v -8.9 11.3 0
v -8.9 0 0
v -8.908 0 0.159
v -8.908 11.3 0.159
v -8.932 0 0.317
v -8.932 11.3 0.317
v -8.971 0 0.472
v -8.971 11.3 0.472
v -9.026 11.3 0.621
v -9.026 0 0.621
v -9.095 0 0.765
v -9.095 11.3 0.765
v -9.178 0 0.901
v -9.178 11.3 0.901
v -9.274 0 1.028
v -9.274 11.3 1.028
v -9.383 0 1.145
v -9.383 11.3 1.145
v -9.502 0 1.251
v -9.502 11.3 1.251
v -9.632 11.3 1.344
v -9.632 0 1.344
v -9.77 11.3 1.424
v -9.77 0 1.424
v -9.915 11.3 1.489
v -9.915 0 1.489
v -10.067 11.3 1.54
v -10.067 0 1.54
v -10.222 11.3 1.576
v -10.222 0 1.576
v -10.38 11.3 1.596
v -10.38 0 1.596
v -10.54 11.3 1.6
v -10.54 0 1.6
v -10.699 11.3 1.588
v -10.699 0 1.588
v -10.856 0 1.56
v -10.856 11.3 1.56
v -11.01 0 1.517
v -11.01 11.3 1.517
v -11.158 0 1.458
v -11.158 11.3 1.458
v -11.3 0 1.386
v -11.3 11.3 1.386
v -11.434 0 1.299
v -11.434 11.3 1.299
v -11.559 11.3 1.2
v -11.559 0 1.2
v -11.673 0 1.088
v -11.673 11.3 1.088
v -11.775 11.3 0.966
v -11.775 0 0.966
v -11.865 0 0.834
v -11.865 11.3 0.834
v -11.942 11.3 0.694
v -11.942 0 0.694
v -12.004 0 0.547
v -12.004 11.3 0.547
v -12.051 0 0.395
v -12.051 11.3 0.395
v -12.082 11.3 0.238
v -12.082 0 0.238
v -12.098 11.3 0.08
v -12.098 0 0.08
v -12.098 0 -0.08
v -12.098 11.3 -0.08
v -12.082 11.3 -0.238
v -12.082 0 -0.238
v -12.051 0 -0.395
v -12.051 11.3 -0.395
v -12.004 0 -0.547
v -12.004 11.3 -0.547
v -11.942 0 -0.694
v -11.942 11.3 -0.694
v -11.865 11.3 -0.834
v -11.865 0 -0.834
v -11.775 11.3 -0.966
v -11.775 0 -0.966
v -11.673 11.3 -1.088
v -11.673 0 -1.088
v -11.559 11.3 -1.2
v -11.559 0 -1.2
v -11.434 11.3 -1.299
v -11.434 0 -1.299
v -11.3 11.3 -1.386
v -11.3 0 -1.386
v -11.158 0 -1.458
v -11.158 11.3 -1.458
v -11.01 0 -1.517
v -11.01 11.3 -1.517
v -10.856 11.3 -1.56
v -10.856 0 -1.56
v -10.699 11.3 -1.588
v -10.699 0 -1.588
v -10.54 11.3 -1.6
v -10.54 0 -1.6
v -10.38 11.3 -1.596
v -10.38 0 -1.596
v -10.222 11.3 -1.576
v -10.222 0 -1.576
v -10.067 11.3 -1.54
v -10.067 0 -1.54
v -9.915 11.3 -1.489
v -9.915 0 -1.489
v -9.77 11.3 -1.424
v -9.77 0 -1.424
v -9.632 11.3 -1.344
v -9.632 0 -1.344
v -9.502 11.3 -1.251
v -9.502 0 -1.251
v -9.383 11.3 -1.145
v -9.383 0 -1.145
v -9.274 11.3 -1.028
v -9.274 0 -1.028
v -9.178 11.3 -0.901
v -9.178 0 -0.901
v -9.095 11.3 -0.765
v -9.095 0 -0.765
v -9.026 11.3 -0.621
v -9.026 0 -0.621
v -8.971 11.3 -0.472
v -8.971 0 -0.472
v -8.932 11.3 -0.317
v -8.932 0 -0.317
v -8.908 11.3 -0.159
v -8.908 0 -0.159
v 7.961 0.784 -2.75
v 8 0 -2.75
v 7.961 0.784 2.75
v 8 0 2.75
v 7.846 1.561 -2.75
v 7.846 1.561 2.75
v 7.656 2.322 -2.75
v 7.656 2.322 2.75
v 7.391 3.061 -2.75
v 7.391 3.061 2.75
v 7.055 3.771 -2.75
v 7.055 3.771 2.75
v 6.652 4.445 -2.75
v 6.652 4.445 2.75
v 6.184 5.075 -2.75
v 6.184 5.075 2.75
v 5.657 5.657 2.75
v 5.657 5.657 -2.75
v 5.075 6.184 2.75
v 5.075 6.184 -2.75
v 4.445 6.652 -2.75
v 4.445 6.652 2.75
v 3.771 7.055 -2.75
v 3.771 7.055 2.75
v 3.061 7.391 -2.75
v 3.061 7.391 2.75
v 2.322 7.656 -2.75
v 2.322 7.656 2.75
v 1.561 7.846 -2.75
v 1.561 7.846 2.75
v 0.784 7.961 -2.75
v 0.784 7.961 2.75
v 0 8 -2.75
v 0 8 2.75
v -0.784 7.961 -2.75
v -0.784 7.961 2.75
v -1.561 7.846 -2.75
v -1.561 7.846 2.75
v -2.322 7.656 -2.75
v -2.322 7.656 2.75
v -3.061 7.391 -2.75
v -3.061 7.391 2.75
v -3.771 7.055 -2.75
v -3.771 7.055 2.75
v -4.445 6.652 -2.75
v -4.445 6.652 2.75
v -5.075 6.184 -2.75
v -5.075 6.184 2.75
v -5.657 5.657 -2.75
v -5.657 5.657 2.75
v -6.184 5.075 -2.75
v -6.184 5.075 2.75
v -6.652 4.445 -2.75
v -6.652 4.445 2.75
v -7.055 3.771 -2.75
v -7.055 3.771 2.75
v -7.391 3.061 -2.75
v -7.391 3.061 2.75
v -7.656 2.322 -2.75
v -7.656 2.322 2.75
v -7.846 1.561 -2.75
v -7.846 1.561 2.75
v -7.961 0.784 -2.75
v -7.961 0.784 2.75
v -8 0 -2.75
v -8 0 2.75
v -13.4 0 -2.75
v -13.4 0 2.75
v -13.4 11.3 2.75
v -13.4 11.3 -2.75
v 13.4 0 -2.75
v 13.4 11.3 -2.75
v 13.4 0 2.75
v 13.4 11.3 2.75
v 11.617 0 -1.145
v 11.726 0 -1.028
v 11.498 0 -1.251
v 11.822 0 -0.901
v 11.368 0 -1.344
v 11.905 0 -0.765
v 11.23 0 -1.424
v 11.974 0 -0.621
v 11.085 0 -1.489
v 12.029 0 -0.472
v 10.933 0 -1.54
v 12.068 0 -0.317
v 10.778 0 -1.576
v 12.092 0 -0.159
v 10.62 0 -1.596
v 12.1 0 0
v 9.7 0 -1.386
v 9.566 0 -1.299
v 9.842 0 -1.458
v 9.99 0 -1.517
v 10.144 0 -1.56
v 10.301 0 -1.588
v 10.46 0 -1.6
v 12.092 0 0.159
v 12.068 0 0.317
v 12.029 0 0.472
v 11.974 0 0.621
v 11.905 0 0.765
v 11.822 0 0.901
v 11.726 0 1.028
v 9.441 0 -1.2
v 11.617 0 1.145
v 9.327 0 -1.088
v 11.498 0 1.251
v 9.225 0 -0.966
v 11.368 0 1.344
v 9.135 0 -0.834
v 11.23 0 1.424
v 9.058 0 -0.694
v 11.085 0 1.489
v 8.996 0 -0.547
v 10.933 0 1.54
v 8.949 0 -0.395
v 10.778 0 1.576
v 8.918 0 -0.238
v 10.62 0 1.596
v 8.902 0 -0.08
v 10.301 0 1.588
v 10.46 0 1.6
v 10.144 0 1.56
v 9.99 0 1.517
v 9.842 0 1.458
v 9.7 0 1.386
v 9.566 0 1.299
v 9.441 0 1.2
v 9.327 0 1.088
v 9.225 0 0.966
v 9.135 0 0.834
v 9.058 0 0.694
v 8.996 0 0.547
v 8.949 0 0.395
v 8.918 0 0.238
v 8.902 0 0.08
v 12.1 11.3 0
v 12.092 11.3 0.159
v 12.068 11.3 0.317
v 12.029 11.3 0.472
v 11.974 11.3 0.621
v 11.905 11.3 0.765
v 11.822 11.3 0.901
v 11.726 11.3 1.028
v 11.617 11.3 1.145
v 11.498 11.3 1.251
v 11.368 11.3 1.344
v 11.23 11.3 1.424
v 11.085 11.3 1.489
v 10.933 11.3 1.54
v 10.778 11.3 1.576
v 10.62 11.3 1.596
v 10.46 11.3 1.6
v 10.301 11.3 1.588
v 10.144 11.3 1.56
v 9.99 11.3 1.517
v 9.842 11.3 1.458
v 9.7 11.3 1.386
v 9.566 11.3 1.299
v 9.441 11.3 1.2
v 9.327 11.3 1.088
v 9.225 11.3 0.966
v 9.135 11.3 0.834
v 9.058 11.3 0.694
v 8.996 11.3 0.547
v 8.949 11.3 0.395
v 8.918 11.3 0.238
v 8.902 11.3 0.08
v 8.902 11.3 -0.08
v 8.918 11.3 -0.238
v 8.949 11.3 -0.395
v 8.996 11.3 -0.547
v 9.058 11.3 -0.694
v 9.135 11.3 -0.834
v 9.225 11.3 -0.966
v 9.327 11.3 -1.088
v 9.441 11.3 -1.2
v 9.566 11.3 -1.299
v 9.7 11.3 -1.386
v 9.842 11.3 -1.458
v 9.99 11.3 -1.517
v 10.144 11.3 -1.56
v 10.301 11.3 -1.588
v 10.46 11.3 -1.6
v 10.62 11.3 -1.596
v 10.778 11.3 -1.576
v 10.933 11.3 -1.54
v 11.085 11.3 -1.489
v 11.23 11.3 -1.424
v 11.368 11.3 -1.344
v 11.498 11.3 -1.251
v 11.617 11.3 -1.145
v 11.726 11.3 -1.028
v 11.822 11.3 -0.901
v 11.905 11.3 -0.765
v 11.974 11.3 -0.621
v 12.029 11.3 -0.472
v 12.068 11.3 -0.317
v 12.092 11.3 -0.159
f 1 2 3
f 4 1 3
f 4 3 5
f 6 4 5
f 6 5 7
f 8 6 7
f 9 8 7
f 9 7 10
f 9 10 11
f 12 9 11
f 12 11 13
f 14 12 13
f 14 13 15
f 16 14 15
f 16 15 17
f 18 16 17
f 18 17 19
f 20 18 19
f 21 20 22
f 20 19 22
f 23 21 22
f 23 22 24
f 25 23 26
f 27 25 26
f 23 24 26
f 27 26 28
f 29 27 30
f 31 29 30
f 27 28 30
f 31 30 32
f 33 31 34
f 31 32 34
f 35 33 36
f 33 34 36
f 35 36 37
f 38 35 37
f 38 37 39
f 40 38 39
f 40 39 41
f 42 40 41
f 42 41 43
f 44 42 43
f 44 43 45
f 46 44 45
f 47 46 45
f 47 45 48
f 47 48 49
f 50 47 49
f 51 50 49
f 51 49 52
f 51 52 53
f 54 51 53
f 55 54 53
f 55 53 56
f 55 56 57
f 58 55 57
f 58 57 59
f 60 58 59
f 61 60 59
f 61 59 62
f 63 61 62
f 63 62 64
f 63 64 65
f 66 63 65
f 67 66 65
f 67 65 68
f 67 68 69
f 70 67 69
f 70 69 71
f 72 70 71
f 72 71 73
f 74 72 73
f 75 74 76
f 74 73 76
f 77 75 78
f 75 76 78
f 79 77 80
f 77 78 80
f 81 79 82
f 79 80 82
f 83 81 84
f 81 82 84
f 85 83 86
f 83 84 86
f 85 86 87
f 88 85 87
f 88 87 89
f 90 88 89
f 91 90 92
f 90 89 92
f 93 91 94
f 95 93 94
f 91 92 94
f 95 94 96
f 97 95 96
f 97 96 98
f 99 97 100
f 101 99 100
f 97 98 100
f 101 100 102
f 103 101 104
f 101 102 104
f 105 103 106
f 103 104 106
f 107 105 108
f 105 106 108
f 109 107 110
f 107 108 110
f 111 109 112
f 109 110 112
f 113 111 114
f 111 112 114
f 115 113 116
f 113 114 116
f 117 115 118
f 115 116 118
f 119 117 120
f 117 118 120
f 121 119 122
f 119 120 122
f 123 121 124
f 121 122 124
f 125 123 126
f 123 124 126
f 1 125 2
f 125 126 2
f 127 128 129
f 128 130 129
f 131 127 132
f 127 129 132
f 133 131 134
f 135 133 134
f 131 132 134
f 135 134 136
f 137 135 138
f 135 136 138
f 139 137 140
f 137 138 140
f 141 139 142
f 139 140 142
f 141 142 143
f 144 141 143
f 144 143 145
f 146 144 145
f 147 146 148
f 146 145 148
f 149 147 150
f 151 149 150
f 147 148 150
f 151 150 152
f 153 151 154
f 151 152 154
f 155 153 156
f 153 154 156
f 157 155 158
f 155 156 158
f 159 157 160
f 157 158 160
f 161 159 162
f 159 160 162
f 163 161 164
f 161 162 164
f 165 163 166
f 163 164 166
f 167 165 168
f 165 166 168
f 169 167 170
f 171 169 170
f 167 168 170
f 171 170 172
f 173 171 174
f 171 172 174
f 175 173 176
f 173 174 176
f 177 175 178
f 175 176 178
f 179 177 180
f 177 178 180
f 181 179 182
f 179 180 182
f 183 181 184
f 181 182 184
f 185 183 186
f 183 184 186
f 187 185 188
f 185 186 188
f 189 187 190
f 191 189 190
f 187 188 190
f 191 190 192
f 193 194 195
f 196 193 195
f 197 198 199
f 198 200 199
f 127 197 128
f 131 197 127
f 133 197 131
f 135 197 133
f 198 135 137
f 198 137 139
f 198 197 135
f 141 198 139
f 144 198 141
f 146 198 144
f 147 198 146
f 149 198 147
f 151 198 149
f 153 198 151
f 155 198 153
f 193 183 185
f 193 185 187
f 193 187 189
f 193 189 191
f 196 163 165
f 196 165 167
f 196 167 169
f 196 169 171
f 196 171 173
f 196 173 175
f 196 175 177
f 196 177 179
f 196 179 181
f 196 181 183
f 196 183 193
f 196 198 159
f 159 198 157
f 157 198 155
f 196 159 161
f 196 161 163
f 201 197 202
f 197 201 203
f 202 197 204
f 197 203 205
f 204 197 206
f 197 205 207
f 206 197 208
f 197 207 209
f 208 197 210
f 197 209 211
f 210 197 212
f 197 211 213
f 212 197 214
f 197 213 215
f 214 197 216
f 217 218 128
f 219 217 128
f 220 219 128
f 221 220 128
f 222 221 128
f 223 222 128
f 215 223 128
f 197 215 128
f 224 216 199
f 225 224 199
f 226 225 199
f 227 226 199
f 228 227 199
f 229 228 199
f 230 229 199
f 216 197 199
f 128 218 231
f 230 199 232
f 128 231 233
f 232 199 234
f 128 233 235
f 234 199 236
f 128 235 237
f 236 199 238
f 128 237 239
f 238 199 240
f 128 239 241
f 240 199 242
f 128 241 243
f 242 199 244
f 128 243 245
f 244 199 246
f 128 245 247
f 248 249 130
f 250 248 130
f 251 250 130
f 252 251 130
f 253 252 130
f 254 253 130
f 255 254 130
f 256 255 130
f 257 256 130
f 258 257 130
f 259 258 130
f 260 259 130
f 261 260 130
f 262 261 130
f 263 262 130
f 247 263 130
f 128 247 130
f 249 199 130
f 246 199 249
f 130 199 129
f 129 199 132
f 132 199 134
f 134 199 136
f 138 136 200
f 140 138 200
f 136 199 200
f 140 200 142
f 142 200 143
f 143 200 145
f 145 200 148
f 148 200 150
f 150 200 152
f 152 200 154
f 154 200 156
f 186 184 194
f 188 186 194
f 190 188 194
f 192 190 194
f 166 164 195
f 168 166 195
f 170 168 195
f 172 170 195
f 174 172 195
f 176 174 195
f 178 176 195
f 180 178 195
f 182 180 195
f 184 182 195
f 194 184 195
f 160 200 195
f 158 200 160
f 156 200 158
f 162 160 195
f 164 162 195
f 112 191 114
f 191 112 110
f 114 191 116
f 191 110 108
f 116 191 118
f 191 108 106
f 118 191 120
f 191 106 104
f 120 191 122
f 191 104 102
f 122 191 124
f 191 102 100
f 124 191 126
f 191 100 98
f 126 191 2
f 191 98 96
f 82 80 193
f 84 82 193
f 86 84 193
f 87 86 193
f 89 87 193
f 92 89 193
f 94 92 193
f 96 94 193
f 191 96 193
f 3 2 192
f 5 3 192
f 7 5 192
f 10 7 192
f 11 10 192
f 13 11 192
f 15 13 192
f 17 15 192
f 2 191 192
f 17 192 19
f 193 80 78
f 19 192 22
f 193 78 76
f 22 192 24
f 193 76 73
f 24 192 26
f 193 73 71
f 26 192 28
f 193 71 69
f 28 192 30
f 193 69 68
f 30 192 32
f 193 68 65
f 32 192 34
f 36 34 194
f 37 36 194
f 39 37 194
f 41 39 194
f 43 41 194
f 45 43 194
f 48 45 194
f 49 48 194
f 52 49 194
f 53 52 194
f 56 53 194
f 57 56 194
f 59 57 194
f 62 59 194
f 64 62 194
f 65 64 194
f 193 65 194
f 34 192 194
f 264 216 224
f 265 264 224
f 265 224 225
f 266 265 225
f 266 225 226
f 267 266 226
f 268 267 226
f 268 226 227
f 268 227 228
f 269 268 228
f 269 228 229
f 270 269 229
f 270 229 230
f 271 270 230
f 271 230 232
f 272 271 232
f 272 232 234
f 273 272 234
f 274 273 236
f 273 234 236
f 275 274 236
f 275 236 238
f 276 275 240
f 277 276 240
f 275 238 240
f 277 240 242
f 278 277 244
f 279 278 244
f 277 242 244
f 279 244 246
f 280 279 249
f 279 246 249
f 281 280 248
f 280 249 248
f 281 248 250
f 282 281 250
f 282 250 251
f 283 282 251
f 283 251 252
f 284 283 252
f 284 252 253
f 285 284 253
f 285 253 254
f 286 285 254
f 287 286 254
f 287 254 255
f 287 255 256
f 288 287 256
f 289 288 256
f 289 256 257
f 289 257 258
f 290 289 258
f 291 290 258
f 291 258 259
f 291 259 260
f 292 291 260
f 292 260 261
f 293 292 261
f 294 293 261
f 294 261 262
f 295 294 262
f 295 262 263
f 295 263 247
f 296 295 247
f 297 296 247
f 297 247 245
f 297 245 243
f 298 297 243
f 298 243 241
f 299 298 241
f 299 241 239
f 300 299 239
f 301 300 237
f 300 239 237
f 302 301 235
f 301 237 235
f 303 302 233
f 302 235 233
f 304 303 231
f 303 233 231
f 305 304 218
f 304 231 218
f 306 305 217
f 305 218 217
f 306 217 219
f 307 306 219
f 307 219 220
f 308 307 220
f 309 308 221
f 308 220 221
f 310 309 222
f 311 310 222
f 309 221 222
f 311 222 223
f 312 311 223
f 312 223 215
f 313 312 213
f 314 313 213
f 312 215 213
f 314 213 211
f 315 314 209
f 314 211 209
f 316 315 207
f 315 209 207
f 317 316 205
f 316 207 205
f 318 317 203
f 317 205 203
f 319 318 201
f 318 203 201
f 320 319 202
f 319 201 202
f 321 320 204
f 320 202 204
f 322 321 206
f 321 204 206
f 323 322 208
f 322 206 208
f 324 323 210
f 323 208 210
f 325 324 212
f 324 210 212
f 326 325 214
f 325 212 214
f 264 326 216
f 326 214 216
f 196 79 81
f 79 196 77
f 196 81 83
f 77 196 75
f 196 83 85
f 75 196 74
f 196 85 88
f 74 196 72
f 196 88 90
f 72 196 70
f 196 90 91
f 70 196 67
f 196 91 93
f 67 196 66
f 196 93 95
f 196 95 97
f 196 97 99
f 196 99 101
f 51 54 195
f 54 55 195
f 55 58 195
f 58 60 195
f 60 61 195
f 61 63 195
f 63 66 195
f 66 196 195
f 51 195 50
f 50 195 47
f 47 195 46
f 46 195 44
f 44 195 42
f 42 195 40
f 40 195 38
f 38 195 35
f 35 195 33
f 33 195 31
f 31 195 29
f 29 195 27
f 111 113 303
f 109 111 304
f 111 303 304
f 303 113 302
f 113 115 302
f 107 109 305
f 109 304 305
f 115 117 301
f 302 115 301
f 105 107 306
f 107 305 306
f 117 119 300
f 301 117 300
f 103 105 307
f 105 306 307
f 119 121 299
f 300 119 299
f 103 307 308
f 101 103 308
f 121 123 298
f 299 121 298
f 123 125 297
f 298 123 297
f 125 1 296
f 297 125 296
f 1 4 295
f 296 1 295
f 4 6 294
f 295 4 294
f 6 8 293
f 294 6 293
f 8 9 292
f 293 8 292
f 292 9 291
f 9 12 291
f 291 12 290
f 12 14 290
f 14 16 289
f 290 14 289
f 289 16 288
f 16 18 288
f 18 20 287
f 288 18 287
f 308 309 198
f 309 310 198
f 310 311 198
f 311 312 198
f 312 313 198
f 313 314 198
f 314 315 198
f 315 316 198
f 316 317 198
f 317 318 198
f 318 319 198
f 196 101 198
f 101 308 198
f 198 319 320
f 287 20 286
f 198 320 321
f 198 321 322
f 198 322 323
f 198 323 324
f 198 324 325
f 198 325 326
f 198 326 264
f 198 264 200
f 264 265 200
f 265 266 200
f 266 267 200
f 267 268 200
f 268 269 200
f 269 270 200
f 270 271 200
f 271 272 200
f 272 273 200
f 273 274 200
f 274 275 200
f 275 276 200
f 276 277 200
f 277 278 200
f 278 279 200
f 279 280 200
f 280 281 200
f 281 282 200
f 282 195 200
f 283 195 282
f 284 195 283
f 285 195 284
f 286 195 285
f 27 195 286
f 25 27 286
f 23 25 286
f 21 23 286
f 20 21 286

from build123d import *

# Parameters (mm, degrees)
BOSS_EXTRUDE1_DEPTH = 2.75
SKETCH2_R           = 1.6
CUT_EXTRUDE1_DEPTH  = 18.742956349


with BuildPart() as part:
    # Sketch1 → Boss-Extrude1 (new, symmetric)
    with BuildSketch(Plane.XY):
        with BuildLine():
            Line((-13.4, 11.3), (13.4, 11.3))
            Line((13.4, 11.3), (13.4, 0))
            Line((13.4, 0), (8, 0))
            ThreePointArc((8, 0), (0, 8), (-8, 0))
            Line((-8, 0), (-13.4, 0))
            Line((-13.4, 0), (-13.4, 11.3))
        make_face()
    extrude(amount=BOSS_EXTRUDE1_DEPTH, both=True)

    # Sketch2 → Cut-Extrude1 (cut, through all)
    with BuildSketch(Plane.XZ):
        with Locations((-10.5, 0)):
            Circle(SKETCH2_R)
        with Locations((10.5, 0)):
            Circle(SKETCH2_R)
    extrude(amount=-CUT_EXTRUDE1_DEPTH, mode=Mode.SUBTRACT)


solid = part.part
